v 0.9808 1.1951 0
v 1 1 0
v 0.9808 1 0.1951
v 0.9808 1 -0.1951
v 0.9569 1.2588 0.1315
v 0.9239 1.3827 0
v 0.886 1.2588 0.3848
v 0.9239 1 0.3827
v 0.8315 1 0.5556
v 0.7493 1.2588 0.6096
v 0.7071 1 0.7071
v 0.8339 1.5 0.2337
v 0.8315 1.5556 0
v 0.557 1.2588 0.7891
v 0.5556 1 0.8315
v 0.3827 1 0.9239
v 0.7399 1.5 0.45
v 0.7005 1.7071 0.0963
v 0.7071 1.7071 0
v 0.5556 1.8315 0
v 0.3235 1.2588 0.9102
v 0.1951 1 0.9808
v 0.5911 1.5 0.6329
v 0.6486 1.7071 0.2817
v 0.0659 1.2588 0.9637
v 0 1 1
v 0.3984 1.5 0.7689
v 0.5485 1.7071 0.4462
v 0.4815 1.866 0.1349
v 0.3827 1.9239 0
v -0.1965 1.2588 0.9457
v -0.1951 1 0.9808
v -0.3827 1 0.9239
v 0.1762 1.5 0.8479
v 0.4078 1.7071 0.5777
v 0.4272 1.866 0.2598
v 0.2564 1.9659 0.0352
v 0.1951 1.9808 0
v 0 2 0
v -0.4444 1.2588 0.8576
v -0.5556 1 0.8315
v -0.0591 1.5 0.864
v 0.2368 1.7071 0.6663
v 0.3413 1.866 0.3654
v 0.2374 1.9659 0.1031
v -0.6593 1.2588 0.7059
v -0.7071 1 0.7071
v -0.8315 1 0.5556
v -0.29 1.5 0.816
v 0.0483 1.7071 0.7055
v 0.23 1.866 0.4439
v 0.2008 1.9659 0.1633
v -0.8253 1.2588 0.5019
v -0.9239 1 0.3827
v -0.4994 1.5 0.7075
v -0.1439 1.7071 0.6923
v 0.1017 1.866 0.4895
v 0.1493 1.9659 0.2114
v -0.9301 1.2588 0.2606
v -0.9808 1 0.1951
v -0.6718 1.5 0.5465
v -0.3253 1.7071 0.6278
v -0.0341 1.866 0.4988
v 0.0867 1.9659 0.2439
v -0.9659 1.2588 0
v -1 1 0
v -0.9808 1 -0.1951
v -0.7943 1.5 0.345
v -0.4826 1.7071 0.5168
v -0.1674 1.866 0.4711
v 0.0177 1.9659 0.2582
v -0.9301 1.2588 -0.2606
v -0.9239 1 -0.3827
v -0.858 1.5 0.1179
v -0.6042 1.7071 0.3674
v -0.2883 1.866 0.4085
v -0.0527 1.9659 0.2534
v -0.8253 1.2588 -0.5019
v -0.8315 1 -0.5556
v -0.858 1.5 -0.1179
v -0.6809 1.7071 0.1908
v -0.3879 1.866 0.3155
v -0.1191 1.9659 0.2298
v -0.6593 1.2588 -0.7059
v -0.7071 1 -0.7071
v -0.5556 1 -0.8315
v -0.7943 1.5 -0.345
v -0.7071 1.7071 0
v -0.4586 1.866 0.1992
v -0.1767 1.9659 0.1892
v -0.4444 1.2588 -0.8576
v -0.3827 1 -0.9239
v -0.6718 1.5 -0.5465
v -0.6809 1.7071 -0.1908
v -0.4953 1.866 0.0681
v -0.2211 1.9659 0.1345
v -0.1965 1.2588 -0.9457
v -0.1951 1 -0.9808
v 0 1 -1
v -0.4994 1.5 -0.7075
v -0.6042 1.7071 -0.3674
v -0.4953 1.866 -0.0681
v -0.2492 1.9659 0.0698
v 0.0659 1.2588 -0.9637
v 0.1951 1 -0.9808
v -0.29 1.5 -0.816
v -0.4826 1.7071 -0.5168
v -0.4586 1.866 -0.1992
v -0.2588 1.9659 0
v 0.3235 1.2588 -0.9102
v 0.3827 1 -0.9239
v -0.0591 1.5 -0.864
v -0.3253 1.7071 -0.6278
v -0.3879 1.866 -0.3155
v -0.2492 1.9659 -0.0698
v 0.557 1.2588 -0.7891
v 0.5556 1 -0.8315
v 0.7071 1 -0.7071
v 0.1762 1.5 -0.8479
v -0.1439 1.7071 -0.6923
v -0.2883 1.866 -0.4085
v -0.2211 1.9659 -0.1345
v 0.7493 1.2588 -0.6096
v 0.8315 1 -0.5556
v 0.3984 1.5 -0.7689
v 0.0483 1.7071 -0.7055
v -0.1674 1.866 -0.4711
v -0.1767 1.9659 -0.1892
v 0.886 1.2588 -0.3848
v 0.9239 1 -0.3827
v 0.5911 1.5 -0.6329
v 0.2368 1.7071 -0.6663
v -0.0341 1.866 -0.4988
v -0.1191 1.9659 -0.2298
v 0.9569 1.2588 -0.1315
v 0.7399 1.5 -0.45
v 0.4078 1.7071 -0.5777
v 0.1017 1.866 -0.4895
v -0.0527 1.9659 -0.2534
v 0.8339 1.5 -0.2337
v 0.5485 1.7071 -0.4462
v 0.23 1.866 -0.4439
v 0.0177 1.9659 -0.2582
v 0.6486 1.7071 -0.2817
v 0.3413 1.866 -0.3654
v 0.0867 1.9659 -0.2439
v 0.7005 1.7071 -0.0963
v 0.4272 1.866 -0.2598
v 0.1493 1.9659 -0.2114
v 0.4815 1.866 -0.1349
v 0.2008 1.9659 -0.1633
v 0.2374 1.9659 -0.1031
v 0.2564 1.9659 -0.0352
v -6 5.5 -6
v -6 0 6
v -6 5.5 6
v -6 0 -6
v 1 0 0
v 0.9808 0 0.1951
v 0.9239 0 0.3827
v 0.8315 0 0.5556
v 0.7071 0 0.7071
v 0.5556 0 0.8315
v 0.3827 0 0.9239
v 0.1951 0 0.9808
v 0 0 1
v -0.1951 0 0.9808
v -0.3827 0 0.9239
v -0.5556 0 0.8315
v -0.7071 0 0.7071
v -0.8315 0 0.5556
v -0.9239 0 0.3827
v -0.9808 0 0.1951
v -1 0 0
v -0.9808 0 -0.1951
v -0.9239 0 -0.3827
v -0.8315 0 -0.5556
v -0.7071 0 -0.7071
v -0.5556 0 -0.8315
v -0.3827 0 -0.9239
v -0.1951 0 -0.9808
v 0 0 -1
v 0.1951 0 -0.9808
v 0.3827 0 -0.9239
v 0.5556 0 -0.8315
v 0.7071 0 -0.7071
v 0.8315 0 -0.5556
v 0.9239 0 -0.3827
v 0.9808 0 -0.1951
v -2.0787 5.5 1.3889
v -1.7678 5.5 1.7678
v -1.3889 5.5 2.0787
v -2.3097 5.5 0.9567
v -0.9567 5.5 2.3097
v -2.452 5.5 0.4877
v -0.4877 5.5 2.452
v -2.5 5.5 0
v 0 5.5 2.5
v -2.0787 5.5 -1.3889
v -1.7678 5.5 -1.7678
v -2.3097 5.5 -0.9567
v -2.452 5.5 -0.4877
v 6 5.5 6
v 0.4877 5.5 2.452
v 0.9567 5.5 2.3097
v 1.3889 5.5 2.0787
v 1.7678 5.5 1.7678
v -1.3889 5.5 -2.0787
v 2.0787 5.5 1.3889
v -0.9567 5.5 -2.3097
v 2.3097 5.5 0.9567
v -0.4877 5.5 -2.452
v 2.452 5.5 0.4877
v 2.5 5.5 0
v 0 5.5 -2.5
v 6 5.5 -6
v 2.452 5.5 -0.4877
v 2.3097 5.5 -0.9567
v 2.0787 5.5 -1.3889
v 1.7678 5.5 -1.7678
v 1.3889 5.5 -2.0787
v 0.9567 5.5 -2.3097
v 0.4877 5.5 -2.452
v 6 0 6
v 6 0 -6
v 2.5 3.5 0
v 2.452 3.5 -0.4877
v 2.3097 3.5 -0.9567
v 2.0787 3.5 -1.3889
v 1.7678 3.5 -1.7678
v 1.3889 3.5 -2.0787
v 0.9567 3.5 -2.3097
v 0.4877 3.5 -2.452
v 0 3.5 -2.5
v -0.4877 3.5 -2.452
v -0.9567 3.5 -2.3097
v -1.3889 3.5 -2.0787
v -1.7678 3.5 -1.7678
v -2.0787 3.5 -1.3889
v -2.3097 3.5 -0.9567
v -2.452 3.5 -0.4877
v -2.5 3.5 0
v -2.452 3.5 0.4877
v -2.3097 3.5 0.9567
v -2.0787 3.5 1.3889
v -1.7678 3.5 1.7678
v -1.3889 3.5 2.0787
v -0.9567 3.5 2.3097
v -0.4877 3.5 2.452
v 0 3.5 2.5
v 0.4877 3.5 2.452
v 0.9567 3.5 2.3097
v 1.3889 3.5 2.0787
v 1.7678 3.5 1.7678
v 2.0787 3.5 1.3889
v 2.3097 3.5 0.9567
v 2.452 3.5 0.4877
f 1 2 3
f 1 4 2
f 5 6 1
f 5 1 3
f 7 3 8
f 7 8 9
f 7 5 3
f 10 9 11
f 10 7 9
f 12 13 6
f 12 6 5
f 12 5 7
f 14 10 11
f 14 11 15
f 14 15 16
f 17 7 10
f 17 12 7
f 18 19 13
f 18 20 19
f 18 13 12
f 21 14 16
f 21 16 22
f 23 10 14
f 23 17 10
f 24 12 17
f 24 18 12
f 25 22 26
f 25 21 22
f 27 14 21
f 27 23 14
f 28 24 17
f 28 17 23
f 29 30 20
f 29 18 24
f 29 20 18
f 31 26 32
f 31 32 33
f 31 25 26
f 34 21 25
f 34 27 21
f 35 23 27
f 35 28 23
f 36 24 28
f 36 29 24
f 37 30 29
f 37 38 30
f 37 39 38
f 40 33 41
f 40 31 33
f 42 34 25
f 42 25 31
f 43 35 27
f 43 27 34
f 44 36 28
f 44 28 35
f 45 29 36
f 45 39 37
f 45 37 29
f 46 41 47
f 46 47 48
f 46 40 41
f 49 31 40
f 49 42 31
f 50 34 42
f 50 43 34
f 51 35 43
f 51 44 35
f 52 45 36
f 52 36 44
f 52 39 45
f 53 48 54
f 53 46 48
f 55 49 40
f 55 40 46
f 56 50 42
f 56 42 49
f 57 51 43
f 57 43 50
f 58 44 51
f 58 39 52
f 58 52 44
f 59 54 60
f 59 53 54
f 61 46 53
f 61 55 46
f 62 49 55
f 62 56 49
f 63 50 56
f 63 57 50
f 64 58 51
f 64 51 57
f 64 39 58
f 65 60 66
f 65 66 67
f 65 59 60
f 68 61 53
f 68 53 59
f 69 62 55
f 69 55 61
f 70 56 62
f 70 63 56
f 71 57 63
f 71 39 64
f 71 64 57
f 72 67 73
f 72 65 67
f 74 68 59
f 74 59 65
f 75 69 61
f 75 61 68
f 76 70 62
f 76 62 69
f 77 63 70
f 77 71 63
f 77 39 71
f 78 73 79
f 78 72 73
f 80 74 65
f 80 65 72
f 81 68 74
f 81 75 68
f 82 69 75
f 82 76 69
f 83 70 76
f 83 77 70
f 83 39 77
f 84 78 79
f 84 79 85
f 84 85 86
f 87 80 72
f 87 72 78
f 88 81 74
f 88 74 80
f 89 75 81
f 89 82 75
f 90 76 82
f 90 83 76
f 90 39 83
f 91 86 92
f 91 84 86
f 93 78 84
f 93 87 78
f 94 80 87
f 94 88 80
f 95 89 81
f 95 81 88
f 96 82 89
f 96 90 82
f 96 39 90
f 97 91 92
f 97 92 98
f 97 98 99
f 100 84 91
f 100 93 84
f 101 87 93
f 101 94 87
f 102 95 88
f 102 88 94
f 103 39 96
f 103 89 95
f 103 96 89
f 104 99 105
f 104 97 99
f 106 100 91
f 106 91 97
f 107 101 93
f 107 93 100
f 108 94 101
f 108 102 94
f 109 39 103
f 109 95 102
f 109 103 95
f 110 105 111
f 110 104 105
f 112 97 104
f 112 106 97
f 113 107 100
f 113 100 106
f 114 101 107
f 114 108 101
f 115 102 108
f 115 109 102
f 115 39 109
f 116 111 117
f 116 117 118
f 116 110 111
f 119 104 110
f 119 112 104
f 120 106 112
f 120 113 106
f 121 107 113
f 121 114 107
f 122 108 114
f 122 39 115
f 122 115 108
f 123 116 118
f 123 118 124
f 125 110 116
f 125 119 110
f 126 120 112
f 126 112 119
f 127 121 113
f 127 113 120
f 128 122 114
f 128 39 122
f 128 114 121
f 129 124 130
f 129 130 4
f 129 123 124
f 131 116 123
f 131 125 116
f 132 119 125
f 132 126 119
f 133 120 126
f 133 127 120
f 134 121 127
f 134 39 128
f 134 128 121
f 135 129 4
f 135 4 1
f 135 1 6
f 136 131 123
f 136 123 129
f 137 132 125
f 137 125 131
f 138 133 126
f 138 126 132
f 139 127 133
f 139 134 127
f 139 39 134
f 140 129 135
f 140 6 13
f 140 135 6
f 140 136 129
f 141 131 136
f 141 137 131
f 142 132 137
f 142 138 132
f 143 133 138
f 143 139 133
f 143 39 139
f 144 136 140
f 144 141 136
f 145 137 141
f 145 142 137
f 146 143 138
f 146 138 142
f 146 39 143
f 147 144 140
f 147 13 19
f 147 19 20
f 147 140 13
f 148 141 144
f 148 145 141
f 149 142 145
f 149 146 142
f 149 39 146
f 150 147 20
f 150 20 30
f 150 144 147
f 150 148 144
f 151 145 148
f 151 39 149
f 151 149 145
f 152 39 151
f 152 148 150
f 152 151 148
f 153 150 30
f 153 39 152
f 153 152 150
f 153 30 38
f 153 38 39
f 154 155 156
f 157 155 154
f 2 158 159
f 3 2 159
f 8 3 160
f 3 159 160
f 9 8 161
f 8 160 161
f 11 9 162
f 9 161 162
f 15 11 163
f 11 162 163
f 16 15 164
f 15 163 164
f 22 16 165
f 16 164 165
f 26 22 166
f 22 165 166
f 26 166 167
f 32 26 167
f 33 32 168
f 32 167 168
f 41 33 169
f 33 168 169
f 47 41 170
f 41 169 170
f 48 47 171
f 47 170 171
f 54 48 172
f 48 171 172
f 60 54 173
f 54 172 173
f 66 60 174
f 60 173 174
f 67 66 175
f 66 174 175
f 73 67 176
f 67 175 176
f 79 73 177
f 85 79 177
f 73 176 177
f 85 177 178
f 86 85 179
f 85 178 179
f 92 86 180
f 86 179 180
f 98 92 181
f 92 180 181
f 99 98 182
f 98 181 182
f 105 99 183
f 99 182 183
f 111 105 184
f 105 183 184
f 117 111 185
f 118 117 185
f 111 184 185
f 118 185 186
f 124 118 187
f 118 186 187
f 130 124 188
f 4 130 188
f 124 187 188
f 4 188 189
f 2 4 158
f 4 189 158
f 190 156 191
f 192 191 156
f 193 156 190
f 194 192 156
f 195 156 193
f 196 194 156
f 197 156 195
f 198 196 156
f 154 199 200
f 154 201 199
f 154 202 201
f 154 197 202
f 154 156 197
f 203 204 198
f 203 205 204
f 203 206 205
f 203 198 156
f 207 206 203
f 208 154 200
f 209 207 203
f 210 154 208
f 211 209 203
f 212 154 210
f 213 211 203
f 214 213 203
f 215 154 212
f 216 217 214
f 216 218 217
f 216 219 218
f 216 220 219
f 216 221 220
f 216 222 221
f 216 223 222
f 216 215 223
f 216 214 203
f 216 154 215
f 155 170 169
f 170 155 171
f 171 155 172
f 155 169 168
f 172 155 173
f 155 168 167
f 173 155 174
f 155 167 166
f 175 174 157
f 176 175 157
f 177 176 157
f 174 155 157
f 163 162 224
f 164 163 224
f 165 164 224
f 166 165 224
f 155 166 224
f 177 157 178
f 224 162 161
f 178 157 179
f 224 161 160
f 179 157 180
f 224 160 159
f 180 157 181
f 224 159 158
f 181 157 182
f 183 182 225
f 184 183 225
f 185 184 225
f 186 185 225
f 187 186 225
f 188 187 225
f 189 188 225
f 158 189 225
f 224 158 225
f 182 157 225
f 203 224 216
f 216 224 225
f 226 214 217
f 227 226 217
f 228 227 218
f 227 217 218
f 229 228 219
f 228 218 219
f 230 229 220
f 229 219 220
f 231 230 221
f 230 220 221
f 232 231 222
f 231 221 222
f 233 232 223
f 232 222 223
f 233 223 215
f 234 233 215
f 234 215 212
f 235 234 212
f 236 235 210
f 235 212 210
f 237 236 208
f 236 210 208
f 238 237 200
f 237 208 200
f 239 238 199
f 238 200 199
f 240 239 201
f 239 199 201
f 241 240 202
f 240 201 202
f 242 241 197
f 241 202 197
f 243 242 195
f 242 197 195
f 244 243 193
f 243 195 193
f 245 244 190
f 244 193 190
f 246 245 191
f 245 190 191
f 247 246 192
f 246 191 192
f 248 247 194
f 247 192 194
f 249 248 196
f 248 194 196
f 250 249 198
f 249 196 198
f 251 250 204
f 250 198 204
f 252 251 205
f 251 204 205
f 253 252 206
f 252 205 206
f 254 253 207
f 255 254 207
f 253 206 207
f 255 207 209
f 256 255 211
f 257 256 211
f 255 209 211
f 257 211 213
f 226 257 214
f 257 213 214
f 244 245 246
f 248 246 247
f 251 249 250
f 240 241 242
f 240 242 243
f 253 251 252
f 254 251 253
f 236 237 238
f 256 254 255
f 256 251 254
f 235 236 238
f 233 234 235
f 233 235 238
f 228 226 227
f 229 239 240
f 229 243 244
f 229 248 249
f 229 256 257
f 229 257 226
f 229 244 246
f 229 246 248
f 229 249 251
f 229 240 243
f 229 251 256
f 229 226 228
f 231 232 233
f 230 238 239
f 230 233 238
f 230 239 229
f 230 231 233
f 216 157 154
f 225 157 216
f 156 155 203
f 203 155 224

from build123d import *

# Parameters (mm, degrees)
SKETCH1_W           = 12
SKETCH1_H           = 12
BOSS_EXTRUDE1_DEPTH = 5.5
SKETCH2_R           = 2.5
CUT_EXTRUDE1_DEPTH  = 2
SKETCH4_R           = 1
CUT_EXTRUDE3_DEPTH  = 2
FILLET2_R           = 1


with BuildPart() as part:
    # Sketch1 → Boss-Extrude1 (new body)
    with BuildSketch(Plane(origin=(0, 0, 0), x_dir=(1, 0, 0), z_dir=(0, 1, 0))):
        Rectangle(SKETCH1_W, SKETCH1_H)
    extrude(amount=BOSS_EXTRUDE1_DEPTH)

    # Sketch2 → Cut-Extrude1 (cut)
    with BuildSketch(Plane(origin=(0, 5.5, 0), x_dir=(1, 0, 0), z_dir=(0, 1, 0))):
        Circle(SKETCH2_R)
    extrude(amount=-CUT_EXTRUDE1_DEPTH, mode=Mode.SUBTRACT)

    # Sketch4 → Cut-Extrude3 (cut)
    with BuildSketch(Plane.XZ):
        Circle(SKETCH4_R)
    extrude(amount=-CUT_EXTRUDE3_DEPTH, mode=Mode.SUBTRACT)

    # Fillet2
    fillet2_edges = [part.edges().sort_by_distance(p)[0] for p in [
        (-1, 2, 0),
    ]]
    fillet(fillet2_edges, radius=FILLET2_R)


solid = part.part
